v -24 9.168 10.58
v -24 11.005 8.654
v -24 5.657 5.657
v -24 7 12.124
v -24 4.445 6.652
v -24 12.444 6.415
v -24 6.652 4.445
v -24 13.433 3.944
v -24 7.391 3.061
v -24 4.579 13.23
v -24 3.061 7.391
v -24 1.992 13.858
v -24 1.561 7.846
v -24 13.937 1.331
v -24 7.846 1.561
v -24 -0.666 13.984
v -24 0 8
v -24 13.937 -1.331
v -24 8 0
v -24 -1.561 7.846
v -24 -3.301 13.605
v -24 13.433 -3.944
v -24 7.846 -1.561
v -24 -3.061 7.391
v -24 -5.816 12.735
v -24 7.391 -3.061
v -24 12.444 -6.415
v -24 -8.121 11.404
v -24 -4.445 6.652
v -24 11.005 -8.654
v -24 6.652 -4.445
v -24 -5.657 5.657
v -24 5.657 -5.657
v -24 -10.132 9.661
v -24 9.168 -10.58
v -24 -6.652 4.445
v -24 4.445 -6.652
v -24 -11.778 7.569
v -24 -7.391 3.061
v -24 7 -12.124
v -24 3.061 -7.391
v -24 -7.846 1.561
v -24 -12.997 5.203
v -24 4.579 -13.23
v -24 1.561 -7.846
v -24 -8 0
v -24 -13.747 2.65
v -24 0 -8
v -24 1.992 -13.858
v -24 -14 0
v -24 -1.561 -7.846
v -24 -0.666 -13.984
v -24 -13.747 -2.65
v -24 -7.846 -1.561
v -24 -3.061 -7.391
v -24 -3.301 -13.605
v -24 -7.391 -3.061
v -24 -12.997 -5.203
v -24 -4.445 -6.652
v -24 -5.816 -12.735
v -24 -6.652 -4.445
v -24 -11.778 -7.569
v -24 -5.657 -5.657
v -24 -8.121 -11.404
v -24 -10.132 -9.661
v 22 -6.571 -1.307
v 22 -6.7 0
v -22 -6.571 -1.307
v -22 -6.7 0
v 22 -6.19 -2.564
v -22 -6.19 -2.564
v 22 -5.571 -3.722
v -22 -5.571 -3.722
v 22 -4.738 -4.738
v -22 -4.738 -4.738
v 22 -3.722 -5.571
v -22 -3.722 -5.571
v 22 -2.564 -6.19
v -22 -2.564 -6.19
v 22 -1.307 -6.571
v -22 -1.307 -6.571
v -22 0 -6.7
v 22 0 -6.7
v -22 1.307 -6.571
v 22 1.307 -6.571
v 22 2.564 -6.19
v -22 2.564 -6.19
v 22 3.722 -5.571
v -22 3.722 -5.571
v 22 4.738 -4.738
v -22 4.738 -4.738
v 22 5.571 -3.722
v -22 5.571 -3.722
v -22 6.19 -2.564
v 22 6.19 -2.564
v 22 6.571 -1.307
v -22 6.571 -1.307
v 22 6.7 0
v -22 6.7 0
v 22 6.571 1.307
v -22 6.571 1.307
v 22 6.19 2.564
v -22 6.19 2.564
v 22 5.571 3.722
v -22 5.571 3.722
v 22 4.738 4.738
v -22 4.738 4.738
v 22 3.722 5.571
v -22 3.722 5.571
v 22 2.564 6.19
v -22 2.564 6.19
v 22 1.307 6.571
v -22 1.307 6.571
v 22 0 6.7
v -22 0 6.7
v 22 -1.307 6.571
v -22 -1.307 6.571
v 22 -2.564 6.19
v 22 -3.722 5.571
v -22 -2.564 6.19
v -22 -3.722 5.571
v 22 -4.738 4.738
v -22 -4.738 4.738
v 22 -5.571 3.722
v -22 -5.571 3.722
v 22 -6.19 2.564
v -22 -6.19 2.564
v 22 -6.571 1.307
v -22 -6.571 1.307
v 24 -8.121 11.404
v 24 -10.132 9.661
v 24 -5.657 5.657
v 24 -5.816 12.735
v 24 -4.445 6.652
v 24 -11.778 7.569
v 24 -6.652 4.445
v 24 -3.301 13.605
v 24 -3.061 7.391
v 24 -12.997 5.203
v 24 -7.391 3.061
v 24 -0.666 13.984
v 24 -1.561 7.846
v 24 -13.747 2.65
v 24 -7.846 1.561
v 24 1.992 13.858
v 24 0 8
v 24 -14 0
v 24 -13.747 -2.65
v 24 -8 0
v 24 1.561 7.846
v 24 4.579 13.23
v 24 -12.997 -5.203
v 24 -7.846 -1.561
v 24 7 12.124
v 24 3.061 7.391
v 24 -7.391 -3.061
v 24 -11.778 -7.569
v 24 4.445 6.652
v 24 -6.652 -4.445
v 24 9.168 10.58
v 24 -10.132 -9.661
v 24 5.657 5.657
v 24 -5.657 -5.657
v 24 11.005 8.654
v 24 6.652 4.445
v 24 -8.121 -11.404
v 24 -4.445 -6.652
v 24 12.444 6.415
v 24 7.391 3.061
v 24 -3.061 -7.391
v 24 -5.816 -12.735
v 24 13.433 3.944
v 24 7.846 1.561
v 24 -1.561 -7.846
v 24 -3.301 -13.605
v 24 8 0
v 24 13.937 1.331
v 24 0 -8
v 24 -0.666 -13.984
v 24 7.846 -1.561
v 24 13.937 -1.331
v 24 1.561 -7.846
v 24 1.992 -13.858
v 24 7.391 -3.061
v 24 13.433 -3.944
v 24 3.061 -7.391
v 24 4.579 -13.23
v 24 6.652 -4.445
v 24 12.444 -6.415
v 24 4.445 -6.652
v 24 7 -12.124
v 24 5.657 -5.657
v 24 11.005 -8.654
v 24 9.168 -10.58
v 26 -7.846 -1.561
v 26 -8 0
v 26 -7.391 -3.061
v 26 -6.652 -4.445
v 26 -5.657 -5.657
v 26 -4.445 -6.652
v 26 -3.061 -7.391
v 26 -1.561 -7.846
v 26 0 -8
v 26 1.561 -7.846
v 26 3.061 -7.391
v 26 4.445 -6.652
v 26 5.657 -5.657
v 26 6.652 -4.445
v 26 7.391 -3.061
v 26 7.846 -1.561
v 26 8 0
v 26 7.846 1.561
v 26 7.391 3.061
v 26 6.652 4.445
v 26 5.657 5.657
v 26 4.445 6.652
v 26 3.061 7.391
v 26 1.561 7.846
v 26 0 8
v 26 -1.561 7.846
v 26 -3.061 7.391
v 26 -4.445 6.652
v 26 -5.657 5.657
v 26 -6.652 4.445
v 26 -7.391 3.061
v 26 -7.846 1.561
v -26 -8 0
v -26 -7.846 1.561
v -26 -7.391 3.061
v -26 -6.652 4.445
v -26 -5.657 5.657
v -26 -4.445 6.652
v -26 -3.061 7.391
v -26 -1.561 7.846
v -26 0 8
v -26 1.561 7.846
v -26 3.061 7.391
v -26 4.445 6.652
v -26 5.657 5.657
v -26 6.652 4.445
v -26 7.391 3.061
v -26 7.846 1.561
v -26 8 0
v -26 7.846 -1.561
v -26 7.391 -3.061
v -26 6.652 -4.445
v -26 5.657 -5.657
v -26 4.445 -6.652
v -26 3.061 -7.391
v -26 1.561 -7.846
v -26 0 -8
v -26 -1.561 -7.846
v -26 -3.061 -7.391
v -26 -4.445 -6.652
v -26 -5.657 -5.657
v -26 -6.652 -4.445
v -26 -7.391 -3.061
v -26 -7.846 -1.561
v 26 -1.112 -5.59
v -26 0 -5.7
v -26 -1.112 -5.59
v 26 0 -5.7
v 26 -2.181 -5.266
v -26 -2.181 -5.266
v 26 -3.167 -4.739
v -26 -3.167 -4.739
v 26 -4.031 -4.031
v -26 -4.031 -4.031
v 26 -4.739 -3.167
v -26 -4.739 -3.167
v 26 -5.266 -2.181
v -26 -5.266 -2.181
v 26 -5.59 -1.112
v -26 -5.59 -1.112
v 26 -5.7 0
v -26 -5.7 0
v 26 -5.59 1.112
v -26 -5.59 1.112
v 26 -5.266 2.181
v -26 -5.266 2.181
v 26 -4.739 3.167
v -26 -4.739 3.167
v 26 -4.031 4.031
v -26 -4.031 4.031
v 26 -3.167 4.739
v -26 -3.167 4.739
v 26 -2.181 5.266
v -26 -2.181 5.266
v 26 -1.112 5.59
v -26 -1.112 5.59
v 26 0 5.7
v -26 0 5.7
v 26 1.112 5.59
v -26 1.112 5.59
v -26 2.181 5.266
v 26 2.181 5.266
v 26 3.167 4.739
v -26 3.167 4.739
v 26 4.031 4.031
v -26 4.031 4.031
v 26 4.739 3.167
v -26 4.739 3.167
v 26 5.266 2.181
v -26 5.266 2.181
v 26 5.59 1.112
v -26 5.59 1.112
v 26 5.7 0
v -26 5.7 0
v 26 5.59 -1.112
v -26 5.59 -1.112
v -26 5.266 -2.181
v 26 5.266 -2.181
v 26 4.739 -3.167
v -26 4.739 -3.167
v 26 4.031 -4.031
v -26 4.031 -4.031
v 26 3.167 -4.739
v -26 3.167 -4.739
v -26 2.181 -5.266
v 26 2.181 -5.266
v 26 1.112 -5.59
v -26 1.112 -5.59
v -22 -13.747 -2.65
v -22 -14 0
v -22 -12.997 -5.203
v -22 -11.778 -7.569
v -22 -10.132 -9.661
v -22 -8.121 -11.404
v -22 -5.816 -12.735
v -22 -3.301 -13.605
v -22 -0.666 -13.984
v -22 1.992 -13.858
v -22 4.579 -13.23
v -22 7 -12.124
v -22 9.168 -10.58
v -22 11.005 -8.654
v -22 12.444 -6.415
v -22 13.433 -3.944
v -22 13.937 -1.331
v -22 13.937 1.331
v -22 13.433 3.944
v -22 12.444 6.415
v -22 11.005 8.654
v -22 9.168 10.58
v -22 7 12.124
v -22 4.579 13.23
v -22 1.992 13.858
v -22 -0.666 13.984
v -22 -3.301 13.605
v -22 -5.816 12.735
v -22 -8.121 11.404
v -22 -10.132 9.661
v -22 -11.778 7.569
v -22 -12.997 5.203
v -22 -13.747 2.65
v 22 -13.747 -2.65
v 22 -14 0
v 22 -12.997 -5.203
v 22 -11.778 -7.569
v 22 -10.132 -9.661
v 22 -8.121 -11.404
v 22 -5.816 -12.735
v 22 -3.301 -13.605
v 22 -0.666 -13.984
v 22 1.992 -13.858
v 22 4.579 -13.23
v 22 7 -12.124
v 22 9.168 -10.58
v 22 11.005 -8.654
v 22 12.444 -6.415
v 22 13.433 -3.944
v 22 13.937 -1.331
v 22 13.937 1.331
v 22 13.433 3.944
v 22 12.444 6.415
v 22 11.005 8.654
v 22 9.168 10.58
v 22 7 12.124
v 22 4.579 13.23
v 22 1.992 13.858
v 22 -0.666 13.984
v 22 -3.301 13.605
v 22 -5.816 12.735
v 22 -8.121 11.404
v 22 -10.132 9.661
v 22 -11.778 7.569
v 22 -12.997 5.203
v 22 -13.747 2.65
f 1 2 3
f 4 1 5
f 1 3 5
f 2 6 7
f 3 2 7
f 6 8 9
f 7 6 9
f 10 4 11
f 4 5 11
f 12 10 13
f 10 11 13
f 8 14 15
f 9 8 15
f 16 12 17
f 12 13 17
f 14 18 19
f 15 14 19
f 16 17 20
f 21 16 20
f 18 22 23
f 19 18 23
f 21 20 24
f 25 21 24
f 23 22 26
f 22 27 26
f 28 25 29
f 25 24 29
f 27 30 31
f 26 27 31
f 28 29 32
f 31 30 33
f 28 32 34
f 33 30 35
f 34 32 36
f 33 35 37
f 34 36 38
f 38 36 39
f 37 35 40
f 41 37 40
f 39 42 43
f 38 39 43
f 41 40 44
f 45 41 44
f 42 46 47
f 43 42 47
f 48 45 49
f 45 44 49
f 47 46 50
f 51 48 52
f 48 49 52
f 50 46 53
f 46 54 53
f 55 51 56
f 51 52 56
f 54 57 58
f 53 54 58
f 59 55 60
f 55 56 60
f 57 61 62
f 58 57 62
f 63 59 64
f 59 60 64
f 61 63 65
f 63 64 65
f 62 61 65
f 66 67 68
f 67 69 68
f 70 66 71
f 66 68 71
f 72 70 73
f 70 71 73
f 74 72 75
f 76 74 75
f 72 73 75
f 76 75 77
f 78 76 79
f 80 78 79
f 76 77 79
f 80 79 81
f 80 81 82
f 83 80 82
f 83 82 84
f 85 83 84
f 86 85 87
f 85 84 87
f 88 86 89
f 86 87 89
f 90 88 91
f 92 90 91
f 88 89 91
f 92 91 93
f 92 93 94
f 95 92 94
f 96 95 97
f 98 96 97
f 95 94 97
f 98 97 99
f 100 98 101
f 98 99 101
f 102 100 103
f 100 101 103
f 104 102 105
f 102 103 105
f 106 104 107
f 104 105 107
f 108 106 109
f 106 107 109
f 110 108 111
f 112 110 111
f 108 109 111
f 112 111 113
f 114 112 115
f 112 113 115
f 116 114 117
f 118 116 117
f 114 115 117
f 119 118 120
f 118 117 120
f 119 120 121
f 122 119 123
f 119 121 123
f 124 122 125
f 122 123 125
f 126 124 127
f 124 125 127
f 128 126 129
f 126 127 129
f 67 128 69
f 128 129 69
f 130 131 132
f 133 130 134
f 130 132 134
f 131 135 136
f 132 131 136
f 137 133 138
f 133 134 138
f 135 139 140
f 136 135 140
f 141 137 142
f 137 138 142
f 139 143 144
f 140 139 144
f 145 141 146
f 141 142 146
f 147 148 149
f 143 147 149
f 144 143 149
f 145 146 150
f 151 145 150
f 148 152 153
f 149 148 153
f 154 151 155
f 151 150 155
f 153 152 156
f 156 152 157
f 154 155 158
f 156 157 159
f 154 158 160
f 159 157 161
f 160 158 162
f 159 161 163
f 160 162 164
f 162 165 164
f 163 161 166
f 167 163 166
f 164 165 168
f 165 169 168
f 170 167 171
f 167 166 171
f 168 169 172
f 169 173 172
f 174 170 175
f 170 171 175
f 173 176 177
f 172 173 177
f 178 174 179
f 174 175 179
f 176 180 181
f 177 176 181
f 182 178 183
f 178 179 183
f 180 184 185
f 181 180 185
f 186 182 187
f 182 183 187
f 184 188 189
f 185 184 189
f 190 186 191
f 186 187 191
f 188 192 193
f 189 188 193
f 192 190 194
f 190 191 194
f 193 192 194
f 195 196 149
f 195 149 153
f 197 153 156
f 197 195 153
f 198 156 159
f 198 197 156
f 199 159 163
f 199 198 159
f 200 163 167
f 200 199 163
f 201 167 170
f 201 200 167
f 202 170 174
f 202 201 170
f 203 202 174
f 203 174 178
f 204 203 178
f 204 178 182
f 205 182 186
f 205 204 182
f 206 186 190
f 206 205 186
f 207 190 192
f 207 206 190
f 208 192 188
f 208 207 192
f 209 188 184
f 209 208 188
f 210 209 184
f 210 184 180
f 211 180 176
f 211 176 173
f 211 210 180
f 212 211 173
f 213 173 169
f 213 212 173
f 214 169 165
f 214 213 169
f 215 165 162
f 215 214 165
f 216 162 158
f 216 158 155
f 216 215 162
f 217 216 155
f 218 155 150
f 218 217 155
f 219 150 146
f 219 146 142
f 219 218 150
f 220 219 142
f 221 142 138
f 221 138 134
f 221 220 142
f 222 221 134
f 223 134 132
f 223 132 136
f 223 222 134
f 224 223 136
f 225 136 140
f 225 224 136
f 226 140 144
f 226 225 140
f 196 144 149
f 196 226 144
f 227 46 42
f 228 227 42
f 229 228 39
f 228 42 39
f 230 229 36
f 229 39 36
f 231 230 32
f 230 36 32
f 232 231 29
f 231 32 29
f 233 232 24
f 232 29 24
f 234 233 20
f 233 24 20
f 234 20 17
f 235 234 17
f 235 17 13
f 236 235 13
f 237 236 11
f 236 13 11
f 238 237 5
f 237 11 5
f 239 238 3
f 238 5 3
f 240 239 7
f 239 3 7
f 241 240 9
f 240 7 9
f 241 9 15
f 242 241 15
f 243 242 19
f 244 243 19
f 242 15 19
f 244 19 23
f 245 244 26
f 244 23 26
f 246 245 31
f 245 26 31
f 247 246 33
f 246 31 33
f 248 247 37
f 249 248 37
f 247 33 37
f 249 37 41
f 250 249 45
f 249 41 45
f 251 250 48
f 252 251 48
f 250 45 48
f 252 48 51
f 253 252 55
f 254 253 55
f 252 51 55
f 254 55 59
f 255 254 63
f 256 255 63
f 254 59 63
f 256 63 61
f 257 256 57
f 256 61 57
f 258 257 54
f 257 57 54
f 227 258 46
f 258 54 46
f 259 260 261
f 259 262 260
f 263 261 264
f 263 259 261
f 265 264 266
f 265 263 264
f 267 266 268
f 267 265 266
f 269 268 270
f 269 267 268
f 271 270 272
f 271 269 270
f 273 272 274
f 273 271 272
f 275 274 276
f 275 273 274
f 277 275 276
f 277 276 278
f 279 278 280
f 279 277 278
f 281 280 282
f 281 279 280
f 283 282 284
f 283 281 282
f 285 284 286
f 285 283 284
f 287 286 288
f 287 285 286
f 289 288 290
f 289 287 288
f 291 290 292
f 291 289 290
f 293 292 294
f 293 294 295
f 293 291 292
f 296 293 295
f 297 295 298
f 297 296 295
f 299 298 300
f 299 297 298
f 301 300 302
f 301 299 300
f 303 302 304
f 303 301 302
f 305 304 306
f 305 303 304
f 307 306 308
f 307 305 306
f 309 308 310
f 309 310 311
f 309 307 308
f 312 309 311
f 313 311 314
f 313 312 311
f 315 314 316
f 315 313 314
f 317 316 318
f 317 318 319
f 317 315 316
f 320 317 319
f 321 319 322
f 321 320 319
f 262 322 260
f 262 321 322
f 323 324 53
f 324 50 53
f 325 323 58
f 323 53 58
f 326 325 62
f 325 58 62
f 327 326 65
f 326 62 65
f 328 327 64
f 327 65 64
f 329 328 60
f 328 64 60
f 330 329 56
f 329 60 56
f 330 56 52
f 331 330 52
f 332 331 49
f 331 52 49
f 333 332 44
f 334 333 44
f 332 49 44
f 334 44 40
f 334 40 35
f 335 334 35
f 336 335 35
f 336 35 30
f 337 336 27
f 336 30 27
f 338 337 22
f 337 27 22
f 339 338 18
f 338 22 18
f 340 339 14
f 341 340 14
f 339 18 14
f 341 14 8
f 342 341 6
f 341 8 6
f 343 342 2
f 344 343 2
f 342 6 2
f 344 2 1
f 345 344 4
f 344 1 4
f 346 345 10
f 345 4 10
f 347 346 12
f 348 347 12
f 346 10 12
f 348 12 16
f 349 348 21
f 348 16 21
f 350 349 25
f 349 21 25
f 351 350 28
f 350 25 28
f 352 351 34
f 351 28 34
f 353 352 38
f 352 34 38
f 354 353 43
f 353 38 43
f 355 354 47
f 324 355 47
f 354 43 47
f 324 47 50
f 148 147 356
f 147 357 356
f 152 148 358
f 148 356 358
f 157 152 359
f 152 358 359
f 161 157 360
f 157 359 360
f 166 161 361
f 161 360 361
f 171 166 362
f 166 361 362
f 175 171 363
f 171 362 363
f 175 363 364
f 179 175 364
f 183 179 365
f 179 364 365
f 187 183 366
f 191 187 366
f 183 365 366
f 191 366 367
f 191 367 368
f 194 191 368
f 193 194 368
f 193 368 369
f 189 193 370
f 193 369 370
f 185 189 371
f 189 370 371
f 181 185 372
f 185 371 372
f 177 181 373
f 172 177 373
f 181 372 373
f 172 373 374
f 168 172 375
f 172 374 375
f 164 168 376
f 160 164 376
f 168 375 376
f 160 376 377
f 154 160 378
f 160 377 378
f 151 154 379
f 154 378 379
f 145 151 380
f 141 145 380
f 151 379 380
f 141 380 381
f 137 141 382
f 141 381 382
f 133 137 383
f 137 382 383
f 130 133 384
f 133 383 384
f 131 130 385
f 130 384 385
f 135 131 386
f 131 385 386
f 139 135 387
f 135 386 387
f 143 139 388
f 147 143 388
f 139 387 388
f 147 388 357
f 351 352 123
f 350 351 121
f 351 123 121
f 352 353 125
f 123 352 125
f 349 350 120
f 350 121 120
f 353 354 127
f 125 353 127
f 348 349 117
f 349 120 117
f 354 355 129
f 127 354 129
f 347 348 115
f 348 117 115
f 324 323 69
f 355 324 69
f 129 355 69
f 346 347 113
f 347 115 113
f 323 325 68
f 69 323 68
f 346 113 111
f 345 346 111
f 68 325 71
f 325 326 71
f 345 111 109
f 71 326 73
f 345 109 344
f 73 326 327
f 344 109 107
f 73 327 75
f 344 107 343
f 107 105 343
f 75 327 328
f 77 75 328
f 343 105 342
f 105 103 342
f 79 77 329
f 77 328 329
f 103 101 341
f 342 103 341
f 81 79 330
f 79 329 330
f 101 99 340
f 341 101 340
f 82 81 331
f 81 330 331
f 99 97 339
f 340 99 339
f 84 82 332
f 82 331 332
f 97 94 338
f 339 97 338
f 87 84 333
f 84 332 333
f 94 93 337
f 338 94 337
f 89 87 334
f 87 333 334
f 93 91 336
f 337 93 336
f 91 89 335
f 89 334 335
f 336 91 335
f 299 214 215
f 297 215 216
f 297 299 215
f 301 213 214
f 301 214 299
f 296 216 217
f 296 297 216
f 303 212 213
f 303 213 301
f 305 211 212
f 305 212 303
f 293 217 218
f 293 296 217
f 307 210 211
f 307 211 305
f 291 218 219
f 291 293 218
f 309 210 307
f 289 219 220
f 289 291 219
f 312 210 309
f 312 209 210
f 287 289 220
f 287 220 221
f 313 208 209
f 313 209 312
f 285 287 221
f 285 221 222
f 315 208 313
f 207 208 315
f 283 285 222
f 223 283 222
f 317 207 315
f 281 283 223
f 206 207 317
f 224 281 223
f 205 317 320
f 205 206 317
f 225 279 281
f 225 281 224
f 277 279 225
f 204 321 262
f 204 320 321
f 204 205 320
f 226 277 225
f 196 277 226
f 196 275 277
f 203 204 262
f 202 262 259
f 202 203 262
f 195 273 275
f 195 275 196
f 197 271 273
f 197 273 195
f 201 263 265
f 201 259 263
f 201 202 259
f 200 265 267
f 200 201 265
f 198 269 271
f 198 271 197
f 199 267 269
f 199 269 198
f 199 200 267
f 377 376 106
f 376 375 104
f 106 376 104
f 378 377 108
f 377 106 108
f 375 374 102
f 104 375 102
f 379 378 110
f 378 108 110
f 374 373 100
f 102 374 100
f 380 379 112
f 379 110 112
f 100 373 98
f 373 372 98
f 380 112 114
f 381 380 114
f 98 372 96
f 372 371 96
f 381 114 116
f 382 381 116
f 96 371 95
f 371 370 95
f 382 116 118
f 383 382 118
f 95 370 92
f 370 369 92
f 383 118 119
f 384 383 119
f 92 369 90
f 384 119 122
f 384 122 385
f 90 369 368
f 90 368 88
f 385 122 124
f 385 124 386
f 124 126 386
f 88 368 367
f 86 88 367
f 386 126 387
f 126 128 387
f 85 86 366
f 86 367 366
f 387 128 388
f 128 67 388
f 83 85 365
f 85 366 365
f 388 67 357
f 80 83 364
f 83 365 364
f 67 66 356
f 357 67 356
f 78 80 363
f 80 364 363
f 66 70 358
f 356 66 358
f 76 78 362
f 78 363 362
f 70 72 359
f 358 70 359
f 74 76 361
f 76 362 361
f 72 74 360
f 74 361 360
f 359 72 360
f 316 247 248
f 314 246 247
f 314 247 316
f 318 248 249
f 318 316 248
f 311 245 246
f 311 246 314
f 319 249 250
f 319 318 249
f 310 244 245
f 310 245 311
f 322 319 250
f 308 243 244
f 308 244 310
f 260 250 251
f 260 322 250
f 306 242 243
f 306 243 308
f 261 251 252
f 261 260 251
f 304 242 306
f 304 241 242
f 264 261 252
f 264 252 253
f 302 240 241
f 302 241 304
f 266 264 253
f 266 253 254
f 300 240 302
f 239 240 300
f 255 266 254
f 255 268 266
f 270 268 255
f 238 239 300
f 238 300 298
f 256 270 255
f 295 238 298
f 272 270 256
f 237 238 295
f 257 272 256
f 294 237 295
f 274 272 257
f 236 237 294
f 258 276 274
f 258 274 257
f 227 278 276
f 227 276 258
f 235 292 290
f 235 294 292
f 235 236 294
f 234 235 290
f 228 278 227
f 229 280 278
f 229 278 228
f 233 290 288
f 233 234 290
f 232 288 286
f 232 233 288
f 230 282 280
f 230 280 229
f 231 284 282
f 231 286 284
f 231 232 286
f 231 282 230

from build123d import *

# Parameters (mm, degrees)
SKETCH2_R           = 5.7
CUT_EXTRUDE1_DEPTH  = 52.923019943
BOSS_EXTRUDE1_START = 2
SKETCH3_R           = 8
SKETCH3_R_2         = 5.7
BOSS_EXTRUDE1_DEPTH = 2
SKETCH4_R           = 8
SKETCH4_R_2         = 5.7
BOSS_EXTRUDE2_DEPTH = 2


with BuildPart() as part:
    # Sketch1 → Revolve1 (revolve)
    with BuildSketch(Plane.XY, mode=Mode.PRIVATE) as revolve1_sk:
        Polygon((-24, 0), (24, 0), (24, 14), (22, 14), (22, 6.7), (-22, 6.7), (-22, 14), (-24, 14), align=None)
    revolve(revolve1_sk.sketch.rotate(Axis((-24, 0, 0), (1, 0, 0)), 180), axis=Axis((-24, 0, 0), (1, 0, 0)))

    # Sketch2 → Cut-Extrude1 (cut, through all)
    with BuildSketch(Plane(origin=(24, 0, 0), x_dir=(0, 0, -1), z_dir=(1, 0, 0))):
        Circle(SKETCH2_R)
    extrude(amount=-CUT_EXTRUDE1_DEPTH, mode=Mode.SUBTRACT)

    # Sketch3 → Boss-Extrude1 (add)
    with BuildSketch(Plane(origin=(24, 0, 0), x_dir=(0, 0, -1), z_dir=(1, 0, 0)).offset(BOSS_EXTRUDE1_START)):
        with Locations(Location((0, 0, 0), (0, 0, 270))):
            Circle(SKETCH3_R)
        Circle(SKETCH3_R_2, mode=Mode.SUBTRACT)
    extrude(amount=-BOSS_EXTRUDE1_DEPTH)

    # Sketch4 → Boss-Extrude2 (add)
    with BuildSketch(Plane.ZY.offset(24)):
        with Locations(Location((0, 0, 0), (0, 0, 270))):
            Circle(SKETCH4_R)
        with Locations(Location((0, 0, 0), (0, 0, 180))):
            Circle(SKETCH4_R_2, mode=Mode.SUBTRACT)
    extrude(amount=BOSS_EXTRUDE2_DEPTH)


solid = part.part
